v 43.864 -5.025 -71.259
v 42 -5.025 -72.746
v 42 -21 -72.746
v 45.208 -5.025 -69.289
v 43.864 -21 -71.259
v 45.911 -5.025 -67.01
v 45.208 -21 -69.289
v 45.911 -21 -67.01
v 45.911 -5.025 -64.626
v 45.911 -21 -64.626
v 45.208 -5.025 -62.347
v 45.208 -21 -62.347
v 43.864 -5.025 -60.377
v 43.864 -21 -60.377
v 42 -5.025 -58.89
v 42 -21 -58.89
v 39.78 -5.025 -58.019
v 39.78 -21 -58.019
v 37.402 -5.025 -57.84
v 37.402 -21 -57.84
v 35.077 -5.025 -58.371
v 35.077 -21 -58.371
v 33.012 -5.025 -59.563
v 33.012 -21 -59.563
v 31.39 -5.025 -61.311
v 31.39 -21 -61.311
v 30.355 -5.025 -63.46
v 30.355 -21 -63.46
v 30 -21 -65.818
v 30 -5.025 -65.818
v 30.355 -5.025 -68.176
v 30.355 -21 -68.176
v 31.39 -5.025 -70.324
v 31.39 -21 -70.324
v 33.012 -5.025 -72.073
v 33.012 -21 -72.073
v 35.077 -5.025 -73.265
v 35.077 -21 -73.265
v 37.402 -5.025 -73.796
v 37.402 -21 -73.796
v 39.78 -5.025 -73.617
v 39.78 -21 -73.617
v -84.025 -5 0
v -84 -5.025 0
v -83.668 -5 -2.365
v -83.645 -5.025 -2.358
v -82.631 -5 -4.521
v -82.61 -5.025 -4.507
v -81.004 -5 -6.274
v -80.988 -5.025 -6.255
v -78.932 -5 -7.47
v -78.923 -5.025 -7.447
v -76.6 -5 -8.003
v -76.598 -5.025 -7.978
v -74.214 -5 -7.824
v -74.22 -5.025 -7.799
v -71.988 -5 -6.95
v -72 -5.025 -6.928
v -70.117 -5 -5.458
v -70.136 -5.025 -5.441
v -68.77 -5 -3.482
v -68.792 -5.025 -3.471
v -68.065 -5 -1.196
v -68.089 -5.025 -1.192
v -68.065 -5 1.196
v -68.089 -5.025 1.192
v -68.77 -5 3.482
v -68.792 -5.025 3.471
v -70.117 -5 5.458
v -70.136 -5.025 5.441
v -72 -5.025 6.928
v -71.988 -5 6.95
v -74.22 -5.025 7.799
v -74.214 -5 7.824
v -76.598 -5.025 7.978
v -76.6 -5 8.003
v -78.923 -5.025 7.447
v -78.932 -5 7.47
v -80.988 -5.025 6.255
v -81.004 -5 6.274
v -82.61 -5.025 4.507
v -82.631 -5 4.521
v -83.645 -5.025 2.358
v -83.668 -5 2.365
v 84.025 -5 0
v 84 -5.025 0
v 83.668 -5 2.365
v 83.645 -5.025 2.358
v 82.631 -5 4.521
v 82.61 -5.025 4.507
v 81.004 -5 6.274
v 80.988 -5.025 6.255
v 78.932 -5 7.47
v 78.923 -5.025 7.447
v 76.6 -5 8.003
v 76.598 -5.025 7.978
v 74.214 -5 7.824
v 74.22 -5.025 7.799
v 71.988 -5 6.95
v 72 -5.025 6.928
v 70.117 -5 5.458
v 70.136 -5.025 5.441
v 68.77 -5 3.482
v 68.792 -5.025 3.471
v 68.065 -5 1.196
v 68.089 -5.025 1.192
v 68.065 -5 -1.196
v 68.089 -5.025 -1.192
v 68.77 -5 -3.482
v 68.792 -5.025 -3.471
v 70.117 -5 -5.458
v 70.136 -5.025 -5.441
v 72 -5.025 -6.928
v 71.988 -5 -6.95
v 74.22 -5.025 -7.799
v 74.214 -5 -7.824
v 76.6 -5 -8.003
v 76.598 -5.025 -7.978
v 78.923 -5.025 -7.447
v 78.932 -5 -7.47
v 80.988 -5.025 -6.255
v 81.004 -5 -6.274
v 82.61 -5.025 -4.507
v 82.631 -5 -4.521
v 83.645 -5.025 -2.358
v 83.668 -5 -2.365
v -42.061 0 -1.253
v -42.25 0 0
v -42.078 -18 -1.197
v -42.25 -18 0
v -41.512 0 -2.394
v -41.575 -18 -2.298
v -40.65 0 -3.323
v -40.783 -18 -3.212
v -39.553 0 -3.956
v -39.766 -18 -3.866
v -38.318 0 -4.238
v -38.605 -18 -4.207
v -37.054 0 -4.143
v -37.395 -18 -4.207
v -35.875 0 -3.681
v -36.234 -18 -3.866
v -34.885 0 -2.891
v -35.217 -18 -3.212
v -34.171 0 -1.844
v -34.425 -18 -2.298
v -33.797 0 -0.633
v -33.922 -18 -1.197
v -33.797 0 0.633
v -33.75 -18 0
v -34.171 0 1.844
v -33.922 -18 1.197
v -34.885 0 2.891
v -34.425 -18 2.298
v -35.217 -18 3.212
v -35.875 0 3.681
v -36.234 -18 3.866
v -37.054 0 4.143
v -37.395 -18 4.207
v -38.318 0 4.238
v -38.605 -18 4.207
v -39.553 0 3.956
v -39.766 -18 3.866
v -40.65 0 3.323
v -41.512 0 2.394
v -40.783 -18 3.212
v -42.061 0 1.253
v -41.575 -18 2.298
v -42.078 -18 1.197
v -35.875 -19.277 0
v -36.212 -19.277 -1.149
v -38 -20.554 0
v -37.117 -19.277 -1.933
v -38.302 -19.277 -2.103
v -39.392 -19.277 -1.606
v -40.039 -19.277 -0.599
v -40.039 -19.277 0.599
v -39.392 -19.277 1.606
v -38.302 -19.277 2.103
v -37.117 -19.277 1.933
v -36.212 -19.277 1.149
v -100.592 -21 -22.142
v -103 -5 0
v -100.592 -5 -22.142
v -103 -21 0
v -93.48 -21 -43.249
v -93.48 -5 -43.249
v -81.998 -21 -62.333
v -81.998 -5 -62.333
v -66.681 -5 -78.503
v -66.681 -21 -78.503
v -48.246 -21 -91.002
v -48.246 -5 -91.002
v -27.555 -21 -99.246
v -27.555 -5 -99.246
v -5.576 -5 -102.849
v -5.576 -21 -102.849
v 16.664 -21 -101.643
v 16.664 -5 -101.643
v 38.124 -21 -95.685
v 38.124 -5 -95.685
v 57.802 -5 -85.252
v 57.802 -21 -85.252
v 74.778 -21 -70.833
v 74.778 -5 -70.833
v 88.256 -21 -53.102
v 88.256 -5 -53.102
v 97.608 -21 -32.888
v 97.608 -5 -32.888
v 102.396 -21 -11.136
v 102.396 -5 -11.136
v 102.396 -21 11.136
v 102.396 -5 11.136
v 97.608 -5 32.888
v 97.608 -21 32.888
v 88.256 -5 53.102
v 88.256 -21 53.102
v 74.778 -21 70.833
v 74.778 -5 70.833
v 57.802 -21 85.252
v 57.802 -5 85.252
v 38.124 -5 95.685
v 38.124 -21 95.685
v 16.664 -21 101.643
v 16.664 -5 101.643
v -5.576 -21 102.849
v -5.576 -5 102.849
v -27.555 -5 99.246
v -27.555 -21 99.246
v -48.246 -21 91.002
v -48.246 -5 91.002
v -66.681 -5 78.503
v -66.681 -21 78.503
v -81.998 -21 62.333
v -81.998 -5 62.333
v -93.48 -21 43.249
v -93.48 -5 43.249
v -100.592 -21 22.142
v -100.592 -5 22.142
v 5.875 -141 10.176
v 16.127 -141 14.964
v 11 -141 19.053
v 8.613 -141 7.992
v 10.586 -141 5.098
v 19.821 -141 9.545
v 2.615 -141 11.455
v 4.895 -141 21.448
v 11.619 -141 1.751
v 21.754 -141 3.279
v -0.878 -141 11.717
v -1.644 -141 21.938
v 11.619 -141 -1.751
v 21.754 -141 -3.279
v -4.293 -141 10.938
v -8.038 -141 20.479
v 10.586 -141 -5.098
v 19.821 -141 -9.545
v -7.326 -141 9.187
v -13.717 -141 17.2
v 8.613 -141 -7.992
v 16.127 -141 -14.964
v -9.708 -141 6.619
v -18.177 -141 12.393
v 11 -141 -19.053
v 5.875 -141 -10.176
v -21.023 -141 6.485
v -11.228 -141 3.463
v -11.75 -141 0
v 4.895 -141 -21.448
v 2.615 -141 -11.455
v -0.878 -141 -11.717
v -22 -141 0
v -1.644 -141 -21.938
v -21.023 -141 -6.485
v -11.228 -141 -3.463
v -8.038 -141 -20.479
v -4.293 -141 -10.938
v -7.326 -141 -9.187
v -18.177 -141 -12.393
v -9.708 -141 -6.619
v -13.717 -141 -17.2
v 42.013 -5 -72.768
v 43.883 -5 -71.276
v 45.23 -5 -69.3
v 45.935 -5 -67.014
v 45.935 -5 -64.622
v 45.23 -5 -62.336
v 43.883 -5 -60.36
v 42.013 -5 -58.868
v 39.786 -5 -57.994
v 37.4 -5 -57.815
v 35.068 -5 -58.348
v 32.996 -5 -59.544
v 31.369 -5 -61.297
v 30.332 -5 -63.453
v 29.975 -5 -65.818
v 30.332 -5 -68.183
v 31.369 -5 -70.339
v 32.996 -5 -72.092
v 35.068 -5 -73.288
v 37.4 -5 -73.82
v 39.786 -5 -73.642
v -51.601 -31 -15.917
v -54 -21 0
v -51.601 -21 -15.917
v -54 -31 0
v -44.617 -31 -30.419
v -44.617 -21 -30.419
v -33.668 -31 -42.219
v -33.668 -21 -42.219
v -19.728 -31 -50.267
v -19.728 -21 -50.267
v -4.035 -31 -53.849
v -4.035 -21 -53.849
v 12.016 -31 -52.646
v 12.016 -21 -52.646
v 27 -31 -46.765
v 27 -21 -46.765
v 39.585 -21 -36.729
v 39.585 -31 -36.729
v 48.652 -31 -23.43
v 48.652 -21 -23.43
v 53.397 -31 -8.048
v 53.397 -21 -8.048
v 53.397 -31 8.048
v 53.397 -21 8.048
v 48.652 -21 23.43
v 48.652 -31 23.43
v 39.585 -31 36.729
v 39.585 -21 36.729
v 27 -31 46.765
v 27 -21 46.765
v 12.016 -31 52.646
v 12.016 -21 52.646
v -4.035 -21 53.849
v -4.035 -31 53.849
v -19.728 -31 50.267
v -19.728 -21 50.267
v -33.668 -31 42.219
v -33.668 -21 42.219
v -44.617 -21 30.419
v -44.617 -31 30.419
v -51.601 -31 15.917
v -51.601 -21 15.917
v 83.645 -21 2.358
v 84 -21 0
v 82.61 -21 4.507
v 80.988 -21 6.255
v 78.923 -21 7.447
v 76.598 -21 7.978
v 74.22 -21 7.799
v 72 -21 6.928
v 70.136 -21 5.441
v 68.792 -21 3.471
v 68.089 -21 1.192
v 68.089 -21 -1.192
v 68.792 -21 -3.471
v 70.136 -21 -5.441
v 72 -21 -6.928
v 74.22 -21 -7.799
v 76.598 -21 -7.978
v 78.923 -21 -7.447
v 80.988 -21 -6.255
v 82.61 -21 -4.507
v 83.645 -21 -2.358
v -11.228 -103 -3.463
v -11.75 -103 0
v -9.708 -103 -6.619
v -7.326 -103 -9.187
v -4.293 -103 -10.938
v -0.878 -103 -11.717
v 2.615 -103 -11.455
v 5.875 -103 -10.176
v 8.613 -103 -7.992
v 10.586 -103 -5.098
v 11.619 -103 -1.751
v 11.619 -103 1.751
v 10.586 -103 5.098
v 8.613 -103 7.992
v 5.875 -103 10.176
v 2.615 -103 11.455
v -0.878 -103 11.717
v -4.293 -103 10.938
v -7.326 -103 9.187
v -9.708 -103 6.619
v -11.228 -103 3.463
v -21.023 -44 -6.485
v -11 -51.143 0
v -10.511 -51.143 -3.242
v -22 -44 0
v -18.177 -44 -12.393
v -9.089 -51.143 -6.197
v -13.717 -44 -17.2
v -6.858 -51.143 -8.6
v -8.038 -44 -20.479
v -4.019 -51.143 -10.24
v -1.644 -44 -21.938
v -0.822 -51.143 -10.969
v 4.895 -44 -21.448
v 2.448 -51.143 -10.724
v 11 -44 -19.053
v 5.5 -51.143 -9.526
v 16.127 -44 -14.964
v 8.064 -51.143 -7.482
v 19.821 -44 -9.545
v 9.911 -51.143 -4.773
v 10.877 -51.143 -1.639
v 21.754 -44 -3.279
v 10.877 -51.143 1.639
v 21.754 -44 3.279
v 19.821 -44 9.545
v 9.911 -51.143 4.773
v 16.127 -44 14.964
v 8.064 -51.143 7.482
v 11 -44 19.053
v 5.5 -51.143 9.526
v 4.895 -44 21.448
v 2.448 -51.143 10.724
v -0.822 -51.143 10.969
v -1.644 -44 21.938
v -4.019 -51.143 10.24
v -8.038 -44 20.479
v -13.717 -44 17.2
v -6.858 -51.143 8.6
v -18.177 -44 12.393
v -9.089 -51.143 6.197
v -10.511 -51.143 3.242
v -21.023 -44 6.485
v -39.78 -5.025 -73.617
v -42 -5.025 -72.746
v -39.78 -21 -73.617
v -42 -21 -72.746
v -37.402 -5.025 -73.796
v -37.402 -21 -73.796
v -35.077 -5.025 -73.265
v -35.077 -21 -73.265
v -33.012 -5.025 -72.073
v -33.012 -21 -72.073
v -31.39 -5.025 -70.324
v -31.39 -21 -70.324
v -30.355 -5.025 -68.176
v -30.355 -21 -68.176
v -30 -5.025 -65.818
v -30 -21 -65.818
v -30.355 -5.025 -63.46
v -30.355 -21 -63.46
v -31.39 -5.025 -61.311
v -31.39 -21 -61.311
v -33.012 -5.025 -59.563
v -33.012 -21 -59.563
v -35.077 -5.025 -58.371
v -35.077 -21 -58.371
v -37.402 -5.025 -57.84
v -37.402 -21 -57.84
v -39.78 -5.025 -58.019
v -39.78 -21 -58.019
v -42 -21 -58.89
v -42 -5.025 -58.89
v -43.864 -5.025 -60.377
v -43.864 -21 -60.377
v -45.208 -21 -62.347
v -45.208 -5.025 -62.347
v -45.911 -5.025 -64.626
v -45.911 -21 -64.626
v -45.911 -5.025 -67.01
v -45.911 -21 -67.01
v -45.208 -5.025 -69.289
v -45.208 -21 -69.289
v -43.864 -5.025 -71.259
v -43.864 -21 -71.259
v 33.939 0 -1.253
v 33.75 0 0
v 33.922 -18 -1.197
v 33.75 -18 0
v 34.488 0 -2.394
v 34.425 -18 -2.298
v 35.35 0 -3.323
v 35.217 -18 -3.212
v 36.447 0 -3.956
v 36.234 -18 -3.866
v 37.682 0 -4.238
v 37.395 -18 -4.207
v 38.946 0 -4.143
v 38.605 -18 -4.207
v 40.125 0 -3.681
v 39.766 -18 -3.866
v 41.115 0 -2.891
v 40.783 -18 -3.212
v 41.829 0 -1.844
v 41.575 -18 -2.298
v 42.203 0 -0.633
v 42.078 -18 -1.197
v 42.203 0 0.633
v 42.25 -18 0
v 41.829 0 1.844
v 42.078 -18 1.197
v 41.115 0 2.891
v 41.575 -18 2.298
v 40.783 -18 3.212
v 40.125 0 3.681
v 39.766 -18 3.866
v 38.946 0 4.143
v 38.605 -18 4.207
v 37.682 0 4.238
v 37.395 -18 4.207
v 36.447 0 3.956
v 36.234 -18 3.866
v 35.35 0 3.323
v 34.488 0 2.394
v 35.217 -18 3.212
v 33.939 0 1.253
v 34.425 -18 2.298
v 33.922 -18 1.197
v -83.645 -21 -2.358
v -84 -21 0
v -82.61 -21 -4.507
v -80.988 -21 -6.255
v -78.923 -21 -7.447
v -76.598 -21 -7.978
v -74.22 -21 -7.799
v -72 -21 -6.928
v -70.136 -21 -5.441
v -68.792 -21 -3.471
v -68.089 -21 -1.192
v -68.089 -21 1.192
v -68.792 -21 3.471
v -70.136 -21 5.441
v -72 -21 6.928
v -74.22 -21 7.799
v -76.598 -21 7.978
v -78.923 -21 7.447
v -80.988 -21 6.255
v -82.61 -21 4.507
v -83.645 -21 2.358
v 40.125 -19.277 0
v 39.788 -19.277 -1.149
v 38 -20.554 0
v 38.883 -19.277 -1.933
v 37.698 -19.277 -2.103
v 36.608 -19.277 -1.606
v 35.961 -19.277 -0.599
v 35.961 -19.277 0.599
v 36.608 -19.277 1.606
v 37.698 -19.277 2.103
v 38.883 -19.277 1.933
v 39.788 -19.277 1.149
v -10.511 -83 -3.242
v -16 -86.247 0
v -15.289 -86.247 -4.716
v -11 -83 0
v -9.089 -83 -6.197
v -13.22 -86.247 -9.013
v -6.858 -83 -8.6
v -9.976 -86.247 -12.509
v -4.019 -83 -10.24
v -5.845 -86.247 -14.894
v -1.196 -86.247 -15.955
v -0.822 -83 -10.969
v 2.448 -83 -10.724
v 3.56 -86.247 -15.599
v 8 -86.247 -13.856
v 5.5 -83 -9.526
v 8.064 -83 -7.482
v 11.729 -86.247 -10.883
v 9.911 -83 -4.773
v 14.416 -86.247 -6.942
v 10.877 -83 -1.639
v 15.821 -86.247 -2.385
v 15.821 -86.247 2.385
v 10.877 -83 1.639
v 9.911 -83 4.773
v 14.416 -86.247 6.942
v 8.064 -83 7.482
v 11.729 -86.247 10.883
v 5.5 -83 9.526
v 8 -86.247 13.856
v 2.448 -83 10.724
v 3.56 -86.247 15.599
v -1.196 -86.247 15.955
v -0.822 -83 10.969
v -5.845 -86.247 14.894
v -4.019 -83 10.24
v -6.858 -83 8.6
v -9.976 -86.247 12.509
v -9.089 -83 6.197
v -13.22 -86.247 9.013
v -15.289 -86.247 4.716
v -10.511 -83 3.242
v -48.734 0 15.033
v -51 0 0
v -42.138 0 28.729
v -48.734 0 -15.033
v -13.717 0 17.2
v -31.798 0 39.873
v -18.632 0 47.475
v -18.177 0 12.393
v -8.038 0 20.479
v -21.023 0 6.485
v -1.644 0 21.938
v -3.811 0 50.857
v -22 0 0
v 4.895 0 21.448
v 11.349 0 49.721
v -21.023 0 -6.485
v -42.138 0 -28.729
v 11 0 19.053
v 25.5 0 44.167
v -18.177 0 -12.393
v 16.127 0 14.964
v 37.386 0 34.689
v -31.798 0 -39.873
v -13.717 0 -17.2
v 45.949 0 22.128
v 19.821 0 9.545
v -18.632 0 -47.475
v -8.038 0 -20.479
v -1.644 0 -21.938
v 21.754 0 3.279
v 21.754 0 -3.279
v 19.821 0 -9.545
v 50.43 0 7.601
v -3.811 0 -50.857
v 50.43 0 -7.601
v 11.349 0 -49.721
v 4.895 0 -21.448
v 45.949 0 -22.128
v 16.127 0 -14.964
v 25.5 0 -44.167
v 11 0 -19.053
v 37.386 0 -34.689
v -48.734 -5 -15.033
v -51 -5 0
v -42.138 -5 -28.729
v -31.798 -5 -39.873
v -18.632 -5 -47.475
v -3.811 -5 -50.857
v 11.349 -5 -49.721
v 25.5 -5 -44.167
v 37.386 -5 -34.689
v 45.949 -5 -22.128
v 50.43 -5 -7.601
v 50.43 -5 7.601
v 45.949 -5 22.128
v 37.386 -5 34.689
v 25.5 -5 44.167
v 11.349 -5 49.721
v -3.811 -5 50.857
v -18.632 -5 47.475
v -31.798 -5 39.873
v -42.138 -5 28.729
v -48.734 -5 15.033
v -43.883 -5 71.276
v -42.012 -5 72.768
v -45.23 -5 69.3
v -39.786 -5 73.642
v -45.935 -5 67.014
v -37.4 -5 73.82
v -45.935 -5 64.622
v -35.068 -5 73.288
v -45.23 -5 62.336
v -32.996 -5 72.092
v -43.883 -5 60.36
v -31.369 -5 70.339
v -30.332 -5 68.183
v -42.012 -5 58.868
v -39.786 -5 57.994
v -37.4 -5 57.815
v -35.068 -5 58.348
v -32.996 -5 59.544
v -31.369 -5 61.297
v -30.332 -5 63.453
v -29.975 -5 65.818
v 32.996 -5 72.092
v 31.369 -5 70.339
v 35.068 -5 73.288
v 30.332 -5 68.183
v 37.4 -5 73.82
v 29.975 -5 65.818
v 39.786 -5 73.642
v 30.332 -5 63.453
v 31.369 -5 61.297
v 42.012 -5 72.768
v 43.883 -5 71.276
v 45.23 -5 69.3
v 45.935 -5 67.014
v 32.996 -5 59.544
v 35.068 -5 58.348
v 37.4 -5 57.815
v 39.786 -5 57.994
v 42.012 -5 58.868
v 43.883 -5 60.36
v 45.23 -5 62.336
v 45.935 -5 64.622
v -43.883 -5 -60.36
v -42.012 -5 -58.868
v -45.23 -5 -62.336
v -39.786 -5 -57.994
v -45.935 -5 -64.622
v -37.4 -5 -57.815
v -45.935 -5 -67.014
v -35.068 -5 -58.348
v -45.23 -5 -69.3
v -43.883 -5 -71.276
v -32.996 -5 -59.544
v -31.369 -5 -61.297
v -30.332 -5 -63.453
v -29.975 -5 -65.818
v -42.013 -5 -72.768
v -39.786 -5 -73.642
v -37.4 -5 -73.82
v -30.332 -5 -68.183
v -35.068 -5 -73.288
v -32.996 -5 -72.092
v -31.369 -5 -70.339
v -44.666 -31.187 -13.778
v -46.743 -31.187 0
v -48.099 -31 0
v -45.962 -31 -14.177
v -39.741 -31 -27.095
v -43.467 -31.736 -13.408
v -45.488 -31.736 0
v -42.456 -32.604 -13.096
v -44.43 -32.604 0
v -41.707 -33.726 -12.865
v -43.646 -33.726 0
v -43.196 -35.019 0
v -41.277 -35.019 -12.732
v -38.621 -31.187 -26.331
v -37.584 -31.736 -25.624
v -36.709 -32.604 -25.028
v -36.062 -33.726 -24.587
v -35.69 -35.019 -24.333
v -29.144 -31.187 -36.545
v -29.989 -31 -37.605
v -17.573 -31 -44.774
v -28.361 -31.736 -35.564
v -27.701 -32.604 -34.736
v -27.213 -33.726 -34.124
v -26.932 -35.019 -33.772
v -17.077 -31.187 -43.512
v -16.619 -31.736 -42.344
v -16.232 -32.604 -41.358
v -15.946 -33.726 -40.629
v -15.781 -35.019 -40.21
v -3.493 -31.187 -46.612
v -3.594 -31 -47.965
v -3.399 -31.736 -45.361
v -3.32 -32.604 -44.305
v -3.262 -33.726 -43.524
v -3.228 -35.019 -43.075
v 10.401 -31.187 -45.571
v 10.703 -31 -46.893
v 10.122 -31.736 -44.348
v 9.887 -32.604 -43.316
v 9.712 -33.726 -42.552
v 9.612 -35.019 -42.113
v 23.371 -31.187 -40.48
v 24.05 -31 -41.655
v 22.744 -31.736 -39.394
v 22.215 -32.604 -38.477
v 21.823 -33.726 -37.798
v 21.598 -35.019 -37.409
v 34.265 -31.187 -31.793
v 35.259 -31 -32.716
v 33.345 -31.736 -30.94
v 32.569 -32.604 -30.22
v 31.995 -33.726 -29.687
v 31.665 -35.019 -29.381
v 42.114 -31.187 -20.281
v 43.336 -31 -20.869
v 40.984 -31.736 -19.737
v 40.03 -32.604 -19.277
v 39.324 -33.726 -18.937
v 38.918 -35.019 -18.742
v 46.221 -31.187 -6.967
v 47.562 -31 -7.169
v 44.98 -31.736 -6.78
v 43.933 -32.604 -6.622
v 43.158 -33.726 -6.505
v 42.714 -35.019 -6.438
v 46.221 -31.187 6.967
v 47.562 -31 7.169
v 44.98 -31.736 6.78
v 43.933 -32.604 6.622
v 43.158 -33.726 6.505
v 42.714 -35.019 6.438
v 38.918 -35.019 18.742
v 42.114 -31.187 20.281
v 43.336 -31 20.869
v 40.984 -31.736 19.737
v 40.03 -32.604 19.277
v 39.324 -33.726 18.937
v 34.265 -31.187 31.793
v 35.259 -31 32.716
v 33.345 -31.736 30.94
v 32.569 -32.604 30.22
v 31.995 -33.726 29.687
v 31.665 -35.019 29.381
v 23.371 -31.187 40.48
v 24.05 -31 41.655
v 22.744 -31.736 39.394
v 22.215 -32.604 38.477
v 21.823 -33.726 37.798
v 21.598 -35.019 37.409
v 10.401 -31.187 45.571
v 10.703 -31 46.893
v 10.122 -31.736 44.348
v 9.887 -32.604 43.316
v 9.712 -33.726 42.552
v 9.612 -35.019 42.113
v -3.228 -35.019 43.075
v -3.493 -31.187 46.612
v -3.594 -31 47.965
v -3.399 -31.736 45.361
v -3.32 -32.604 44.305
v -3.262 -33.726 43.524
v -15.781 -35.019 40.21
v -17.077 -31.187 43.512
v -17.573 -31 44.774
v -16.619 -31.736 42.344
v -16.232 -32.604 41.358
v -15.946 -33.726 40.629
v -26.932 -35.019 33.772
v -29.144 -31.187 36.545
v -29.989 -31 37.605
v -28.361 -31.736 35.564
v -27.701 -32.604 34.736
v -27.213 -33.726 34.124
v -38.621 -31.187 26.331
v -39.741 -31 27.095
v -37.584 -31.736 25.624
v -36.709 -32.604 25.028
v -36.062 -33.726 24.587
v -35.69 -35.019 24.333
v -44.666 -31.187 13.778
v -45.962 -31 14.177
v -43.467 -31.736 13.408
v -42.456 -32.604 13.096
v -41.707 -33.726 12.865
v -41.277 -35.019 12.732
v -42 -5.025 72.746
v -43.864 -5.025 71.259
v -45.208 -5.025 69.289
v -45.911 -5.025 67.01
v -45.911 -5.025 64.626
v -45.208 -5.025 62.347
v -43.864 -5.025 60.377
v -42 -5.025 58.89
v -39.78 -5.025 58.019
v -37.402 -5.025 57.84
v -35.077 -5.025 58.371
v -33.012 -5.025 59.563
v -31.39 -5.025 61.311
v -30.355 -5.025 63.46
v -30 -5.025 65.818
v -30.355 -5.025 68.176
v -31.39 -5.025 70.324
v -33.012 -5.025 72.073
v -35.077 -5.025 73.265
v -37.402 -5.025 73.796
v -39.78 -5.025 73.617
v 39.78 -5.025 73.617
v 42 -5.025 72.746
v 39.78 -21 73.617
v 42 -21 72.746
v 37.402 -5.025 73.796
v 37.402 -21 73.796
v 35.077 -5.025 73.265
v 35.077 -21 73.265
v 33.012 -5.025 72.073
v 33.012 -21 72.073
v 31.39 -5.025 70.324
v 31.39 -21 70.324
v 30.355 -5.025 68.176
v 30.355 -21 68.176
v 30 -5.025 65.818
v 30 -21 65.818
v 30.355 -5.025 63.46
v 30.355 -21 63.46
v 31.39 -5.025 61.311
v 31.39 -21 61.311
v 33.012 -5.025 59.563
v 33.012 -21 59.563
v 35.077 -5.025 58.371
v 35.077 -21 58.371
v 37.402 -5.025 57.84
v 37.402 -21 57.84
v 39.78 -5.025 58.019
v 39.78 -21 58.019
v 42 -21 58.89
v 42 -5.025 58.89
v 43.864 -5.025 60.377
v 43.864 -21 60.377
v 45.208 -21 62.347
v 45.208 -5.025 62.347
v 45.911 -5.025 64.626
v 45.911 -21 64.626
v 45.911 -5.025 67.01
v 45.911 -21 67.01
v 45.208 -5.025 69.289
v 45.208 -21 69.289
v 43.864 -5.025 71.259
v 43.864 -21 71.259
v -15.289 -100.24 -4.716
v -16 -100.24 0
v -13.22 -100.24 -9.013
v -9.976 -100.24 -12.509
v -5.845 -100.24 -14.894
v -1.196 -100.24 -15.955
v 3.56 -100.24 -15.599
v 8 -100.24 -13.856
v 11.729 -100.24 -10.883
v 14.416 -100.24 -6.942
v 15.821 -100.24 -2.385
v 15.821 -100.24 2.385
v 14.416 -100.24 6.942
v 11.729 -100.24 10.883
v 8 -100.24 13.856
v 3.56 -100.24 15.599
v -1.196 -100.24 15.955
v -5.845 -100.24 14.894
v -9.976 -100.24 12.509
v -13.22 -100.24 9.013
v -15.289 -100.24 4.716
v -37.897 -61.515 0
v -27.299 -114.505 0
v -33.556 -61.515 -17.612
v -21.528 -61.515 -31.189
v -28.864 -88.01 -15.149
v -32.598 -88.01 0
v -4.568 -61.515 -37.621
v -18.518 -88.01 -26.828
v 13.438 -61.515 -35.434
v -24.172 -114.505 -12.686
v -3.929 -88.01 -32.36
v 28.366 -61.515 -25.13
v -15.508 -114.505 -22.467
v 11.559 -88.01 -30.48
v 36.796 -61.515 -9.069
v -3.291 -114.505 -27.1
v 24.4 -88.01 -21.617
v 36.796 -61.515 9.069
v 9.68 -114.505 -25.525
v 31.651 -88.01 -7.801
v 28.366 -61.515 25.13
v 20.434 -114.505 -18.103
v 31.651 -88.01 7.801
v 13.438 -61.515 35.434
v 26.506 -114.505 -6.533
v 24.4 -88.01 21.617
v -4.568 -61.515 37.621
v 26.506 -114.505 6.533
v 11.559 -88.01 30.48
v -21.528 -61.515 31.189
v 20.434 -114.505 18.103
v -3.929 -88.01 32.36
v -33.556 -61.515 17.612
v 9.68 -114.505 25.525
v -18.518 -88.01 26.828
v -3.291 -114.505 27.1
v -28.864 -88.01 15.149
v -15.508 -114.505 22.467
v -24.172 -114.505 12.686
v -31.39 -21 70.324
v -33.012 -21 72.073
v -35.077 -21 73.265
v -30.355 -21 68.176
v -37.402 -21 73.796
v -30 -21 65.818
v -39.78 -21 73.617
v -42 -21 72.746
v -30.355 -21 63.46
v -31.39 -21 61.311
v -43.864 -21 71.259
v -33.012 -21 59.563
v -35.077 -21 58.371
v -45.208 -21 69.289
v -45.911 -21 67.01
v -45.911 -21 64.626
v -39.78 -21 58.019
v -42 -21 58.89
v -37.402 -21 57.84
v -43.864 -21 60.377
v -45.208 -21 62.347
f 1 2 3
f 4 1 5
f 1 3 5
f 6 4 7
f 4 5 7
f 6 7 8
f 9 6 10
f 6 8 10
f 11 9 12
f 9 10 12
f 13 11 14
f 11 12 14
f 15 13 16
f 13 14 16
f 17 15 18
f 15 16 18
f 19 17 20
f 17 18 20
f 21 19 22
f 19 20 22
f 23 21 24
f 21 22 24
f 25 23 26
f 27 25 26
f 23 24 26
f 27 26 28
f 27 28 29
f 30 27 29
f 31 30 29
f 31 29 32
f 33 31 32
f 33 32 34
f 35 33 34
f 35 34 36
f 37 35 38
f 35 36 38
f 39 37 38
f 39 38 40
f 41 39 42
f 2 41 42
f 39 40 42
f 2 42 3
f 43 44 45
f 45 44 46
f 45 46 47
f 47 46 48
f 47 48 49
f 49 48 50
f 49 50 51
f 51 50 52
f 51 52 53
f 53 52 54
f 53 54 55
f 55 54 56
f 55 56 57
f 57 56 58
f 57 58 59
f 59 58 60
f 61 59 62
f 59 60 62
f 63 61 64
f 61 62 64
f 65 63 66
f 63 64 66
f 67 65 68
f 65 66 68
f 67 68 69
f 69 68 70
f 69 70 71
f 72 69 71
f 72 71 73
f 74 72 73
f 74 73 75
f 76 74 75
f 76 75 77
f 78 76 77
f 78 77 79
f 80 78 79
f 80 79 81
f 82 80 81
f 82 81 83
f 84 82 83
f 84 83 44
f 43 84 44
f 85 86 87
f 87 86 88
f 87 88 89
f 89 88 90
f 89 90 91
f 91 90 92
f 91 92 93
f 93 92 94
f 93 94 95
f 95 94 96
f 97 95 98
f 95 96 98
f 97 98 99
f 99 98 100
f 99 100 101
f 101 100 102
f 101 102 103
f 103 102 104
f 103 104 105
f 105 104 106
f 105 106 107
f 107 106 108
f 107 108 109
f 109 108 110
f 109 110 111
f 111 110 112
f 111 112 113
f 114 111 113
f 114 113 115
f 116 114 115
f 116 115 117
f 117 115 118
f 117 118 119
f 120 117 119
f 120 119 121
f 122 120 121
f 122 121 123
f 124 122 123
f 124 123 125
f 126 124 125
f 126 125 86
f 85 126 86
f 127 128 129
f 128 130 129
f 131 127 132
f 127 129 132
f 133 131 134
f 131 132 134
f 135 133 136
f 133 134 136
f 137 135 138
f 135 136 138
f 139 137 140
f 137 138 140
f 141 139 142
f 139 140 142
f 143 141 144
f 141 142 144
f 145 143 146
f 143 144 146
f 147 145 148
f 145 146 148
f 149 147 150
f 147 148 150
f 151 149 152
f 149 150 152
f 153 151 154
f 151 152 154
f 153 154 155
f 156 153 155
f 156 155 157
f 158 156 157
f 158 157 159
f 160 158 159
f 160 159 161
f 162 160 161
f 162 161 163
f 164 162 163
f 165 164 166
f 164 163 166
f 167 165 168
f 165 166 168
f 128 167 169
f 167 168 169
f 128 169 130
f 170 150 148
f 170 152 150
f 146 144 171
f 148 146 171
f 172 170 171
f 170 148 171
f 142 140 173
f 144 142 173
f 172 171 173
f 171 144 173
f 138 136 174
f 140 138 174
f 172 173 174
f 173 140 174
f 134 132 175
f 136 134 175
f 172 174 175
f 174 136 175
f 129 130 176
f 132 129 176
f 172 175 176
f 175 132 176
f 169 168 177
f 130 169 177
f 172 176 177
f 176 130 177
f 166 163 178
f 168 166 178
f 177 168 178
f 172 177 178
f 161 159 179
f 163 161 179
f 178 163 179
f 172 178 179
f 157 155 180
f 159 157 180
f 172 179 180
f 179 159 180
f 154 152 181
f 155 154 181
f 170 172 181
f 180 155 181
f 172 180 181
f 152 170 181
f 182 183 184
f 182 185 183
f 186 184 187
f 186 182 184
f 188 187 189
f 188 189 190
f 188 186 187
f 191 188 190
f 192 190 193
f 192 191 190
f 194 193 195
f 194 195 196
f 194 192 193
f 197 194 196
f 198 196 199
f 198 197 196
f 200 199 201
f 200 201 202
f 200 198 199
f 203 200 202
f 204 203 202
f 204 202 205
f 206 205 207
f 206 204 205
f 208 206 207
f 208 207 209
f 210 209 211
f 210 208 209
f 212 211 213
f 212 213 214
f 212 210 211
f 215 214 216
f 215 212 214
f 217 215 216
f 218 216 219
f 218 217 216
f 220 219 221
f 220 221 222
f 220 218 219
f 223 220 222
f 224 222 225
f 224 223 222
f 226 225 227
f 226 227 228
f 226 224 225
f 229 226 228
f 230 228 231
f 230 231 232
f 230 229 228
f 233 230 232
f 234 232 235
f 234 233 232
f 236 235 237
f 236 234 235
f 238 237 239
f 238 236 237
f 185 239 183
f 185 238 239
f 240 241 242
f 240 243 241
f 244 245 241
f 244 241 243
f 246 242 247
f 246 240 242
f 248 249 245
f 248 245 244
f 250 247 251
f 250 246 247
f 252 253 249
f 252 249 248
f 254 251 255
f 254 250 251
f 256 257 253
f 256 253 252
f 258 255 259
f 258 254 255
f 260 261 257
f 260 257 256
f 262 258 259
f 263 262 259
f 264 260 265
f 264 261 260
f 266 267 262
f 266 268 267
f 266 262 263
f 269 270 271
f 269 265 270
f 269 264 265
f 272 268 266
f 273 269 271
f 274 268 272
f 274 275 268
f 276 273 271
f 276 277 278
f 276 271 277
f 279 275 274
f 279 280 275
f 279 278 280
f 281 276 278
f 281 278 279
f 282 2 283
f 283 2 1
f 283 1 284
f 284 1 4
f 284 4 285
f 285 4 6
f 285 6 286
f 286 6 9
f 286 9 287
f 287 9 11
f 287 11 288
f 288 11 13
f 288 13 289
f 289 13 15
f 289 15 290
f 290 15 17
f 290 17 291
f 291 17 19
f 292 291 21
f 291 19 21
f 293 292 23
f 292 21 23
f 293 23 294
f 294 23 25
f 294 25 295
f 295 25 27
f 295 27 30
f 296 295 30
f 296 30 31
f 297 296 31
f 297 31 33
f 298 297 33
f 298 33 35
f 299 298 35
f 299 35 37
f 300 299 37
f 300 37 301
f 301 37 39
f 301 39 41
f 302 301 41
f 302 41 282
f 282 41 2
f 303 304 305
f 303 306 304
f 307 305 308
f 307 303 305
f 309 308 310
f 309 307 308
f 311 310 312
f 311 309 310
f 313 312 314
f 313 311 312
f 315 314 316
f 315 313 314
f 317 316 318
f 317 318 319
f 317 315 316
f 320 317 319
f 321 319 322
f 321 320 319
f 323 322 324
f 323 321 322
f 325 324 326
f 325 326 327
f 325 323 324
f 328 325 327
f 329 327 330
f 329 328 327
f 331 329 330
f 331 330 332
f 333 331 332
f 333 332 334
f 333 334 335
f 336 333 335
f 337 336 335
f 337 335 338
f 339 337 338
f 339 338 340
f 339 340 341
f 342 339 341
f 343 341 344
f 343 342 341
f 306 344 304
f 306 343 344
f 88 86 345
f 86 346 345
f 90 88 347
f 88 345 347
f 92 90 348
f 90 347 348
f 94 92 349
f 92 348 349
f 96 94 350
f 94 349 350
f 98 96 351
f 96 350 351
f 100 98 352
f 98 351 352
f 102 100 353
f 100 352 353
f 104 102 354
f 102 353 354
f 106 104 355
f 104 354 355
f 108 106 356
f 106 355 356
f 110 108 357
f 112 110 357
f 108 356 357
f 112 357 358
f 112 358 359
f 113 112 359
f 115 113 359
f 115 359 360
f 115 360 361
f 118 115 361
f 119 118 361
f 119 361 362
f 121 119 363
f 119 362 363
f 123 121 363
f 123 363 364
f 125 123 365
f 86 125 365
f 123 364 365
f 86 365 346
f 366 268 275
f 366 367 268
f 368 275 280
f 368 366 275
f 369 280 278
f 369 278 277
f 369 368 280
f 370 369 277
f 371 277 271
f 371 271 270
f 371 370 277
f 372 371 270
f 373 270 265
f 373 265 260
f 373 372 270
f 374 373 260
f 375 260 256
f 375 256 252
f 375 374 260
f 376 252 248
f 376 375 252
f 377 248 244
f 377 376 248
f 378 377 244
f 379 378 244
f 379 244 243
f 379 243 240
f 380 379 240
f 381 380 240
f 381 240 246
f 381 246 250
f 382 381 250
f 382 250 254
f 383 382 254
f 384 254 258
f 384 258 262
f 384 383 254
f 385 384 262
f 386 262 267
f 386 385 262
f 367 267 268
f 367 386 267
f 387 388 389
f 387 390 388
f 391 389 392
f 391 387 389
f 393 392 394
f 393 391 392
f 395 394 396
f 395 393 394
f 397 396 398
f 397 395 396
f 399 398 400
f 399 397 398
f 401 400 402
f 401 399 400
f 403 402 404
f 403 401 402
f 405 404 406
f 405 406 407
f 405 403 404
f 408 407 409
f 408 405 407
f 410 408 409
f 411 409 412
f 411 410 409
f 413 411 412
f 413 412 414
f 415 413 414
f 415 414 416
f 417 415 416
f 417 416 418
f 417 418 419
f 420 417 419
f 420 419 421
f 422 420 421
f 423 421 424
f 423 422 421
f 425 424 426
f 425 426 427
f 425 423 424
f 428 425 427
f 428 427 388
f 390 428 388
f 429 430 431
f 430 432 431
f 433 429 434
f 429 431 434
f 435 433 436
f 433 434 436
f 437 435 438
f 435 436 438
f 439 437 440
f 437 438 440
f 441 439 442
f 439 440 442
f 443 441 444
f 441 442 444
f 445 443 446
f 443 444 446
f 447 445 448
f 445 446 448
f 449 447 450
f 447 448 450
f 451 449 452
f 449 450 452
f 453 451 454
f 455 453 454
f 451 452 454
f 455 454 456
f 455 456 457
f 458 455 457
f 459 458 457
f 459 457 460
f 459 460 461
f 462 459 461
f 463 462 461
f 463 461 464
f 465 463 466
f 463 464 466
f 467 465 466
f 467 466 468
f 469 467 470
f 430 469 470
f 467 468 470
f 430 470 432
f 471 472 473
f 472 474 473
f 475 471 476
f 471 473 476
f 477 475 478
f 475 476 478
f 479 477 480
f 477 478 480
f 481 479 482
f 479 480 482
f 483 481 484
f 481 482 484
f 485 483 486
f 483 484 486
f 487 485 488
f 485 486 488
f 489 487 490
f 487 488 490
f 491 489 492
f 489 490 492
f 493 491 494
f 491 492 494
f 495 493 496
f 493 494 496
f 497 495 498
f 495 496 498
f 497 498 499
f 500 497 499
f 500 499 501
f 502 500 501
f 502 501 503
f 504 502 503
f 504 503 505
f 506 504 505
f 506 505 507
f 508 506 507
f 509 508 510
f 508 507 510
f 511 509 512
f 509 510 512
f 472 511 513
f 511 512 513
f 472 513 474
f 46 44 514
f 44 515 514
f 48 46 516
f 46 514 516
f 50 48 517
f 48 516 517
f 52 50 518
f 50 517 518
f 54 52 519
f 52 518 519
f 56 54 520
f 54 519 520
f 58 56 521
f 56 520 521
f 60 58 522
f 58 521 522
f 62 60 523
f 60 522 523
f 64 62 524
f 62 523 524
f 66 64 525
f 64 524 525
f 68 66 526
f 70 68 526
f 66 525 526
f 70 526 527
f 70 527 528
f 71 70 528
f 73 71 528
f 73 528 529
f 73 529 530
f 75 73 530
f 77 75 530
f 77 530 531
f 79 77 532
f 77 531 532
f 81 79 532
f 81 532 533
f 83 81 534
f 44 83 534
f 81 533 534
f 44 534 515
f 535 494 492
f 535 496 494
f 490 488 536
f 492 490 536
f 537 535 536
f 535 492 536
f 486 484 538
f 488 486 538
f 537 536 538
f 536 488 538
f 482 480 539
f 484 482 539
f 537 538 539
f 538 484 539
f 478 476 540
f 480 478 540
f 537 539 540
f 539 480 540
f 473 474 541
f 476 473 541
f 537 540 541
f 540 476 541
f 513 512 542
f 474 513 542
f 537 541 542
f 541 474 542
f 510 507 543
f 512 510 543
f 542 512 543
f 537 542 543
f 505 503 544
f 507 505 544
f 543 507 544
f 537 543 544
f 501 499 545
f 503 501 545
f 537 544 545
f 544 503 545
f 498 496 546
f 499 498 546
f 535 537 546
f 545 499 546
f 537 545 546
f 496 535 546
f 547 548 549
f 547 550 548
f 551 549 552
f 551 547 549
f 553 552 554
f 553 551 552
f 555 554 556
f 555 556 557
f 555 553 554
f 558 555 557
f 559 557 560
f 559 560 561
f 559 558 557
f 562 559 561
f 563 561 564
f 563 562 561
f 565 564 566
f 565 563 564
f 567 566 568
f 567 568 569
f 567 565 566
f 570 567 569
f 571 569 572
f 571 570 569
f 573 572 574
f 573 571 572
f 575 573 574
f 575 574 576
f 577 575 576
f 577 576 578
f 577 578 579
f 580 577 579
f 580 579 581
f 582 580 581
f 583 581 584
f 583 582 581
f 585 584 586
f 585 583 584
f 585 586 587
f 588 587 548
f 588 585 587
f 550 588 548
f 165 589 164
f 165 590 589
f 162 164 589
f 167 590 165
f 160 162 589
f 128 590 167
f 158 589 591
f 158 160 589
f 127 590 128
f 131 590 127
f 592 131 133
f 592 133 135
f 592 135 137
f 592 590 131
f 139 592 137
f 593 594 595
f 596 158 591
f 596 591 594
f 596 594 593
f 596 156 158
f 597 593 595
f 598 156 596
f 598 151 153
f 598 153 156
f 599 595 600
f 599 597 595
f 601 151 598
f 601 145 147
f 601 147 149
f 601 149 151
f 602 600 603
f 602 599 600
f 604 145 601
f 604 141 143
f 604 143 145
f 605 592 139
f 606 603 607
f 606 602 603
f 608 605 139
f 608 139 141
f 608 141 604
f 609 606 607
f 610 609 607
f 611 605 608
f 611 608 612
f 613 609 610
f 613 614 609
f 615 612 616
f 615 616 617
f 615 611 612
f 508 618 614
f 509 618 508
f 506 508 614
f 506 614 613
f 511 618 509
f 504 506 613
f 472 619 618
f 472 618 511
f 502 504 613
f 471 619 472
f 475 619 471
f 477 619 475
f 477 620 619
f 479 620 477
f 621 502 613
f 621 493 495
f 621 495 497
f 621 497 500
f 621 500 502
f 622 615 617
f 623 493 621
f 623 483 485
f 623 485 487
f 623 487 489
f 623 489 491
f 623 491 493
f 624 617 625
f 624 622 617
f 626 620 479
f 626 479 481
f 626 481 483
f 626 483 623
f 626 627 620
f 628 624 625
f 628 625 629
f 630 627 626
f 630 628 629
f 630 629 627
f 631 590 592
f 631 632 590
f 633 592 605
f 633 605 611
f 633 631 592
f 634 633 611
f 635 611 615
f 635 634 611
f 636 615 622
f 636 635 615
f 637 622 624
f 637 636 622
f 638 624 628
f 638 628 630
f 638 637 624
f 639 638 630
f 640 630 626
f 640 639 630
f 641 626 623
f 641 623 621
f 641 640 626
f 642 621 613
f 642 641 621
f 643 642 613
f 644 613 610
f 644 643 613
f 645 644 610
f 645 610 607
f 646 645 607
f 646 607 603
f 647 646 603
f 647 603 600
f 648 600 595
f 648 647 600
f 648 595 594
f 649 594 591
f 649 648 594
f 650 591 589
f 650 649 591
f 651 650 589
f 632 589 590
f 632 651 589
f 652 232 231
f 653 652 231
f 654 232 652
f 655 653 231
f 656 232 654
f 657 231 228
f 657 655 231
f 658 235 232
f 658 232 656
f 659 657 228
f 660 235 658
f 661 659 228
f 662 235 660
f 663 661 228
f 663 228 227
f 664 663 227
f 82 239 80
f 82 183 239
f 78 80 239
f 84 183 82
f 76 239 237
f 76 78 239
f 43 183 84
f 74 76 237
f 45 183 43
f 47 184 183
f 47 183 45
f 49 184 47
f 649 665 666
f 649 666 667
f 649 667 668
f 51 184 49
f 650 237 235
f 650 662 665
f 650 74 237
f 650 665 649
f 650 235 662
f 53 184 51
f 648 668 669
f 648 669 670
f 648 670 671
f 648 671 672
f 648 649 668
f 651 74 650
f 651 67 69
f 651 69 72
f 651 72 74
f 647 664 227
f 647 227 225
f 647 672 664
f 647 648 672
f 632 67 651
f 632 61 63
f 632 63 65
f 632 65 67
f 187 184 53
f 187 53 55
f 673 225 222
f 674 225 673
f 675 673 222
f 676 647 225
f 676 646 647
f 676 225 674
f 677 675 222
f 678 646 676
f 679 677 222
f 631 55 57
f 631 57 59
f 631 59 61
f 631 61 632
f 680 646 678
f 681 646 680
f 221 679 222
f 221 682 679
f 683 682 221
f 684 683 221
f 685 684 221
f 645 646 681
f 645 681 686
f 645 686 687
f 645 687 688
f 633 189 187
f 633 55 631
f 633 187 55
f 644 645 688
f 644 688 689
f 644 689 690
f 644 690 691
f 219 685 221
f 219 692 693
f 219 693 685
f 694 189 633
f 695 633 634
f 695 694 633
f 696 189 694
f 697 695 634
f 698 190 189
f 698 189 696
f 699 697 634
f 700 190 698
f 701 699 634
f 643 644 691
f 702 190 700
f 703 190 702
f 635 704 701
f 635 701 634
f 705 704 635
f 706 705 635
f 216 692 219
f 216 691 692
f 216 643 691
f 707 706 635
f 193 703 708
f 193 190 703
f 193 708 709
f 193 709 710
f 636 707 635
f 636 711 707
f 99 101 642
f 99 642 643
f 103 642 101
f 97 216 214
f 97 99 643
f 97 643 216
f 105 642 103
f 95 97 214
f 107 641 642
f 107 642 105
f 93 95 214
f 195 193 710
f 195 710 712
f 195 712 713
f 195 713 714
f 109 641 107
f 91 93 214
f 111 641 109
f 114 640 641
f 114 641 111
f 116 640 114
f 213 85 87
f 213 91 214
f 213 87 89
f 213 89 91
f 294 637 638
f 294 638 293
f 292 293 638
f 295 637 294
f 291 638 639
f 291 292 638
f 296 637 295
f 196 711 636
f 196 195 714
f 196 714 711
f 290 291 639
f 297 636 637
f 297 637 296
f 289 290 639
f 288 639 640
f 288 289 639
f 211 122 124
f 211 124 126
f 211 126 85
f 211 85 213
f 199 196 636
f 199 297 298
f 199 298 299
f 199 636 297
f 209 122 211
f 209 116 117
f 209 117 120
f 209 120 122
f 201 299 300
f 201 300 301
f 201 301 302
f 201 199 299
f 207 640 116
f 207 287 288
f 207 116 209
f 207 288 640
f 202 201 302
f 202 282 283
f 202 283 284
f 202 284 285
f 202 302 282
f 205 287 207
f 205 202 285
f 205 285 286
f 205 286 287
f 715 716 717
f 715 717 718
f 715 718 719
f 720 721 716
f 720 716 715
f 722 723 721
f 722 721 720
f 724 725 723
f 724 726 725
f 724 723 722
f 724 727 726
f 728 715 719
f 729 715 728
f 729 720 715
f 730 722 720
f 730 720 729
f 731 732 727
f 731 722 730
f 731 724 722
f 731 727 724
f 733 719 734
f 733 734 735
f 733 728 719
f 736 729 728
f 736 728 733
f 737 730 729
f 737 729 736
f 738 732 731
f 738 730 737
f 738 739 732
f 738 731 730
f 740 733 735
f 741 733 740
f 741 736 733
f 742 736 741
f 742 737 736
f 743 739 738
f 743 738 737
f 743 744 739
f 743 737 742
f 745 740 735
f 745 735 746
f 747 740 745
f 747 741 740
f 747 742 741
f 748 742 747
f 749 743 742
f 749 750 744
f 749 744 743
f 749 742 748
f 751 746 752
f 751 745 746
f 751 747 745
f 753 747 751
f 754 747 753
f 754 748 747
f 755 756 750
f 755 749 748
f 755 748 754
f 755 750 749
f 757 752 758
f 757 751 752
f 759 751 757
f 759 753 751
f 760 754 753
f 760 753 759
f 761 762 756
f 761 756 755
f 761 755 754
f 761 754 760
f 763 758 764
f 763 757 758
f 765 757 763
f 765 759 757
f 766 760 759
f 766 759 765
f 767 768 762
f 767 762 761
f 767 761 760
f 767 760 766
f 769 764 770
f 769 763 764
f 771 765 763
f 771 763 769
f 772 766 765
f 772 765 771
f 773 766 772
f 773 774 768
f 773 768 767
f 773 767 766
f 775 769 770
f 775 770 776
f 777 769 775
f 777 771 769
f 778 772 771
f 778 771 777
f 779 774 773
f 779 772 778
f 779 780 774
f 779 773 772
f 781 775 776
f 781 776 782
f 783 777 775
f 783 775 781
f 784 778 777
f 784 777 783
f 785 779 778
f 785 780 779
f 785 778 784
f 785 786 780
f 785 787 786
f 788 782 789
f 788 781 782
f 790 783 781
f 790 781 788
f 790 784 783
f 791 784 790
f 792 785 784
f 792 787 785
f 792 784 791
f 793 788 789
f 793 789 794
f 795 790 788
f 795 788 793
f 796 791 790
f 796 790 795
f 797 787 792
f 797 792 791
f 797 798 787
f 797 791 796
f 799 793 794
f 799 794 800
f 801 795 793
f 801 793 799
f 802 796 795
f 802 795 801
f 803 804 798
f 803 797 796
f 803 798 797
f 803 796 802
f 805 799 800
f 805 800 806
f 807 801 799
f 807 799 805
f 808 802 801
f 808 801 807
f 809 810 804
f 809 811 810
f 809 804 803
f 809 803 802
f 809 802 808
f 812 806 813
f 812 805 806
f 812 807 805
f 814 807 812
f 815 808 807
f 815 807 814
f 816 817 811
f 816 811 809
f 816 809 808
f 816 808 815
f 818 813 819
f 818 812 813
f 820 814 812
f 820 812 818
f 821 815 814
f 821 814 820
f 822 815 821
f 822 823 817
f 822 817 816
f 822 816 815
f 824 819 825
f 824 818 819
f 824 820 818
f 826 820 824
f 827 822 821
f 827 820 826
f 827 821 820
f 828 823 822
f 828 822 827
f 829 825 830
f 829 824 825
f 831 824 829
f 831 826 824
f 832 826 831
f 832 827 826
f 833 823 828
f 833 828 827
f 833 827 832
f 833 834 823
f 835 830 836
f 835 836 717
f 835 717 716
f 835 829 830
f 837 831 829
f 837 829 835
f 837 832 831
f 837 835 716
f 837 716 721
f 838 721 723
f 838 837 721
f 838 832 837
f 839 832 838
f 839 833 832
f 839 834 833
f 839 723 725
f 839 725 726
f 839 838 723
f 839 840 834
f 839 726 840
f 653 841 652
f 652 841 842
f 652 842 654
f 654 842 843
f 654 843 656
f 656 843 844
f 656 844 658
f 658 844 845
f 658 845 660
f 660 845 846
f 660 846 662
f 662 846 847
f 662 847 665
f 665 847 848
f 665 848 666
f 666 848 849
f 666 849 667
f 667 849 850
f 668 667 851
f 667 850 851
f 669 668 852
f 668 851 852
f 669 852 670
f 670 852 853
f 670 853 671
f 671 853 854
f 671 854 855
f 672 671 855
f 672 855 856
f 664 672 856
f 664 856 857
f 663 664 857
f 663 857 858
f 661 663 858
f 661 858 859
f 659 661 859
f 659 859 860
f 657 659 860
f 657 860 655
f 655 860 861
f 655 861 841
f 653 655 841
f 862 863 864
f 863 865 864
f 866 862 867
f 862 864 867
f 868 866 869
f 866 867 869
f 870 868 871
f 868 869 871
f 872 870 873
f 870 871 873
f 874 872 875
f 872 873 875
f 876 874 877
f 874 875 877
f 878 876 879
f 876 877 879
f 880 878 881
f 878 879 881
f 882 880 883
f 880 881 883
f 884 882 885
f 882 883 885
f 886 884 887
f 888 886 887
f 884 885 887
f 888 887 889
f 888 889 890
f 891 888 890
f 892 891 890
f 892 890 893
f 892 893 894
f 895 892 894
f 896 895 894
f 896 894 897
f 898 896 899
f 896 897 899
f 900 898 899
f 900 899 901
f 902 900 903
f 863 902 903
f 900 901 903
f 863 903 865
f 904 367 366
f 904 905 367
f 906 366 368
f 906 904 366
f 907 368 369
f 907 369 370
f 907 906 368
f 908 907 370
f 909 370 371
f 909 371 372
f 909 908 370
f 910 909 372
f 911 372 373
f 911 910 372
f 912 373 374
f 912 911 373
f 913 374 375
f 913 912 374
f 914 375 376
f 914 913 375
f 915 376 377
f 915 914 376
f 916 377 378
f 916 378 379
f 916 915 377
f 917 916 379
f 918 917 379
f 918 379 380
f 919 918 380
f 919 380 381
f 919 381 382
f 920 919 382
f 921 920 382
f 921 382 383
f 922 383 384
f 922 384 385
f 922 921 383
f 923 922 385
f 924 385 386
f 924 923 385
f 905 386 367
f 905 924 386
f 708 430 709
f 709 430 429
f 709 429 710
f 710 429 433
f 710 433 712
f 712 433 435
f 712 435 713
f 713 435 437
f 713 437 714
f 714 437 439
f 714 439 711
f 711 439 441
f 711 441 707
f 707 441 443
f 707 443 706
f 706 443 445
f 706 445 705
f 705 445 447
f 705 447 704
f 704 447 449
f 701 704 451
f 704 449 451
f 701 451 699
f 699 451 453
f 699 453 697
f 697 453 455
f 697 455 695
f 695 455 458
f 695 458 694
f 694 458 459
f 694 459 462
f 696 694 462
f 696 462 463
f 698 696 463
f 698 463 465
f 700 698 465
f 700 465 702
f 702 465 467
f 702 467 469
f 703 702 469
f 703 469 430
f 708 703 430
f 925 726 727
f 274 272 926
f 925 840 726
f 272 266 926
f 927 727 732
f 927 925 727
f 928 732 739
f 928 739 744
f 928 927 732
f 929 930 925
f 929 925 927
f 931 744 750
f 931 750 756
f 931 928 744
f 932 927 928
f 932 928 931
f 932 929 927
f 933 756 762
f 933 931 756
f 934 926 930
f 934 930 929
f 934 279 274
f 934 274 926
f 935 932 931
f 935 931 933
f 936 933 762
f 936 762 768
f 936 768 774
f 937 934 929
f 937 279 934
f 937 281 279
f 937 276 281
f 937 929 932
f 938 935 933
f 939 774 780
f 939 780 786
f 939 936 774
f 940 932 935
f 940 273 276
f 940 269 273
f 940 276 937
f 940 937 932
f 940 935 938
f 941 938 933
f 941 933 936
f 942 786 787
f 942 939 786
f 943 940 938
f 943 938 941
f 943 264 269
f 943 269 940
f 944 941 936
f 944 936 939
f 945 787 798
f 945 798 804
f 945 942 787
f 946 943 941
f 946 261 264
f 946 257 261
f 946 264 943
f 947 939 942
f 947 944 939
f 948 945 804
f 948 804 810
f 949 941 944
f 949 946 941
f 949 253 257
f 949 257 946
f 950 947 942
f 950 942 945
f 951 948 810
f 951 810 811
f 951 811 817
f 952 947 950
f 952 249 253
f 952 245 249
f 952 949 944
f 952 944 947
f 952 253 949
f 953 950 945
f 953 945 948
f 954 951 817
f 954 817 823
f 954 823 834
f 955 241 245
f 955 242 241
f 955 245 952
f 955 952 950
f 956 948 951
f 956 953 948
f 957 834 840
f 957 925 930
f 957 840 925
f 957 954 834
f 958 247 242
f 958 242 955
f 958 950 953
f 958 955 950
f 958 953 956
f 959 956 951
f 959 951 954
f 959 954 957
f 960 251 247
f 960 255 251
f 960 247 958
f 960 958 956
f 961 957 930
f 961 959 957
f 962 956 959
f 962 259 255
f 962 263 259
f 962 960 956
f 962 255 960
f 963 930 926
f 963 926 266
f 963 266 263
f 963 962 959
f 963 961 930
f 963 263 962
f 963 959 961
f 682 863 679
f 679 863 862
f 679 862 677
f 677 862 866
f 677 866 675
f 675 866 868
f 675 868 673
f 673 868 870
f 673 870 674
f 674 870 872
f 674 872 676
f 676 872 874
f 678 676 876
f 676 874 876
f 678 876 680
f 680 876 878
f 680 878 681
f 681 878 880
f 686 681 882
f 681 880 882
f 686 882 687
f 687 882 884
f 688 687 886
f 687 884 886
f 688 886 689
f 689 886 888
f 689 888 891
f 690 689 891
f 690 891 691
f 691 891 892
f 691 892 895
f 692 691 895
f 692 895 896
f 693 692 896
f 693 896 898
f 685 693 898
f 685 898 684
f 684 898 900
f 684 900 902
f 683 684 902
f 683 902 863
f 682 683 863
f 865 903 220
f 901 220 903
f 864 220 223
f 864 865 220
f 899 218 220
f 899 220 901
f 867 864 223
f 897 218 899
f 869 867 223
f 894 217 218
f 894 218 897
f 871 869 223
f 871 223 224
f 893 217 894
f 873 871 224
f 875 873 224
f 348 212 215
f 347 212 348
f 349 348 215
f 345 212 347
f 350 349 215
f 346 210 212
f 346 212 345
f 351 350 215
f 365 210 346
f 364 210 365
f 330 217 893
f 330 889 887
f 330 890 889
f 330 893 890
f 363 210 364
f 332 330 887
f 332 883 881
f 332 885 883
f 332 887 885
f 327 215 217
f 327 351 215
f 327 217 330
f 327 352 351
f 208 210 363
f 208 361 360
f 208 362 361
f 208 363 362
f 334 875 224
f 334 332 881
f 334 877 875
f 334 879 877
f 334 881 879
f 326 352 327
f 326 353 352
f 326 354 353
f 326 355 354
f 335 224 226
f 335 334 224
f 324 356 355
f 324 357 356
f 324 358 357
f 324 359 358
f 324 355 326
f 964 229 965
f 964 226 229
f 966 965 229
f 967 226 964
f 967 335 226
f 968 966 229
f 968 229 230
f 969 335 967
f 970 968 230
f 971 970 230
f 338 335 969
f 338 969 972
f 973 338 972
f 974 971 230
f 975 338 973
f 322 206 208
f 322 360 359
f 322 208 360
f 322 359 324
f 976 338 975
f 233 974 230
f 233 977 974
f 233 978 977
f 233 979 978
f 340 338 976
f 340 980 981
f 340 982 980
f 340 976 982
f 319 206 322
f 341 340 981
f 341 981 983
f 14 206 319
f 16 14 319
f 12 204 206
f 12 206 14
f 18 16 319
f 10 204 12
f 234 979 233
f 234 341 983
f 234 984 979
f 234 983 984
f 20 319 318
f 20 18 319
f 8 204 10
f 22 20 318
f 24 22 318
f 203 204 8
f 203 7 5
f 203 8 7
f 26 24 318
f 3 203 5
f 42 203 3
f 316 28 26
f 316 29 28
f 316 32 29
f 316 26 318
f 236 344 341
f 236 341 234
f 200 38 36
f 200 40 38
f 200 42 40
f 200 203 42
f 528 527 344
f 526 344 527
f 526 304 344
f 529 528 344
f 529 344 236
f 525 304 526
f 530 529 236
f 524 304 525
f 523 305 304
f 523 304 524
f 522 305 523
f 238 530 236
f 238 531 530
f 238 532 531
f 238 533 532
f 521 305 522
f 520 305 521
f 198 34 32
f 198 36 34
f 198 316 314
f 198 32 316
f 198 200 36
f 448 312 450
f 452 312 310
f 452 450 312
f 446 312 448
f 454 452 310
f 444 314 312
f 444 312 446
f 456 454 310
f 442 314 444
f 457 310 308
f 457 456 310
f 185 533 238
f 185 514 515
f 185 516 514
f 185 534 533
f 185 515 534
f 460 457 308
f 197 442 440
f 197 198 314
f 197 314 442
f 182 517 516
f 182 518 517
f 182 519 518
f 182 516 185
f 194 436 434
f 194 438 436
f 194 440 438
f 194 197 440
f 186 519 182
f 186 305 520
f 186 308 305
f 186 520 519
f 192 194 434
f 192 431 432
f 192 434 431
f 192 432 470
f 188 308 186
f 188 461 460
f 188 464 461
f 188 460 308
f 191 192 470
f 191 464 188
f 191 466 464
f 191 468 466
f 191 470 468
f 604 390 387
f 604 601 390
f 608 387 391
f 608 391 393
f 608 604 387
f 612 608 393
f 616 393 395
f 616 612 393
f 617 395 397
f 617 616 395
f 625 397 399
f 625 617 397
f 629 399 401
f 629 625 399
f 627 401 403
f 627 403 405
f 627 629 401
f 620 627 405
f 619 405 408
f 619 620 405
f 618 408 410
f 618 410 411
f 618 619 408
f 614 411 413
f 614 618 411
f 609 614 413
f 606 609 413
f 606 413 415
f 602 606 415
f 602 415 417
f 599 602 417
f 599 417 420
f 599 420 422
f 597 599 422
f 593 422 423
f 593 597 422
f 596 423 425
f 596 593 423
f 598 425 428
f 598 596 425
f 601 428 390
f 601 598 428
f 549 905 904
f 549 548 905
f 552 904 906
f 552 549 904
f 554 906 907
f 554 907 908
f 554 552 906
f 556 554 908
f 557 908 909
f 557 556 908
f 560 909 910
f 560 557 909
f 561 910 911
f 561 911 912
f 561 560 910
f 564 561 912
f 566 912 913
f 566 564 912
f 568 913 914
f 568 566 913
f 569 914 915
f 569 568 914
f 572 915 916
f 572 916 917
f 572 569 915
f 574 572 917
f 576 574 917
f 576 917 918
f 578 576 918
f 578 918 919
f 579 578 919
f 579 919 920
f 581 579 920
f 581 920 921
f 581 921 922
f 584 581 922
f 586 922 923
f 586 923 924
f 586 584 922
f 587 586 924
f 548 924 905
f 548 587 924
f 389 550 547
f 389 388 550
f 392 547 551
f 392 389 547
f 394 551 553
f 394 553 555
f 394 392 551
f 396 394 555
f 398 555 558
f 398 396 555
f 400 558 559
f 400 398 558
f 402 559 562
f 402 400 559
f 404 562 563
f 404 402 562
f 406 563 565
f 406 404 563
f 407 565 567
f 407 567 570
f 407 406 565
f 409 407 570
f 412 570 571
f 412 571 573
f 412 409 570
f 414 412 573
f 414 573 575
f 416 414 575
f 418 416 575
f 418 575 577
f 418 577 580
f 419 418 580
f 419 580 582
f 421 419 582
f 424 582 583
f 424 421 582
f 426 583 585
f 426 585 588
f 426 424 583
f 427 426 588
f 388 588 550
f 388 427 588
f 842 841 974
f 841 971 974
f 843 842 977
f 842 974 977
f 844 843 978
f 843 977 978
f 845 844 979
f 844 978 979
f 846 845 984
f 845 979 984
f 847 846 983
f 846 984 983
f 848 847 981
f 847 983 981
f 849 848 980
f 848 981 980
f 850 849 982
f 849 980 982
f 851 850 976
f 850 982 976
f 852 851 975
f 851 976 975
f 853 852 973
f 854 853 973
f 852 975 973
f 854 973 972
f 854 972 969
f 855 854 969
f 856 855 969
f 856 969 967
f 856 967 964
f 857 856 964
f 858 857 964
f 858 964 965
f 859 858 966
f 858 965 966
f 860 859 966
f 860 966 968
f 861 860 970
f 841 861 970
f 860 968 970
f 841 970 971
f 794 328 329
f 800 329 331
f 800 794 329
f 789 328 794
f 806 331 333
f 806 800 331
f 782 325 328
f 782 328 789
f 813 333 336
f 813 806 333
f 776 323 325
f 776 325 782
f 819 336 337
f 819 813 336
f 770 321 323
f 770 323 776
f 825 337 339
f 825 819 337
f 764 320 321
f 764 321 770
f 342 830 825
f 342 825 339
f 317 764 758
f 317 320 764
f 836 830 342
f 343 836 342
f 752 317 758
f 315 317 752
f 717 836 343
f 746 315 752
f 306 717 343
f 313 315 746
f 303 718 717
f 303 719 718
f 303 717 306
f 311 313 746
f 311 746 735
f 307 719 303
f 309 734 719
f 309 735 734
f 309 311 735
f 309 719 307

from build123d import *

# Parameters (mm, degrees)
FILLET1_R                            = 5
F_16_0_16_DIAMETER_HOLE1_D           = 16
F_16_0_16_DIAMETER_HOLE1_CSINK_D     = 16.05
F_16_0_16_DIAMETER_HOLE1_CSINK_ANGLE = 90
CIRPATTERN1_COUNT                    = 6
M10X1_5_TAPPED_HOLE1_D               = 8.5
M10X1_5_TAPPED_HOLE1_DEPTH           = 18
M10X1_5_TAPPED_HOLE1_TIP             = 2.553657631


with BuildPart() as part:
    # Sketch1 → Revolve1 (revolve)
    with BuildSketch(Plane.XY, mode=Mode.PRIVATE) as revolve1_sk:
        Polygon((0, 0), (51, 0), (51, -5), (103, -5), (103, -21), (54, -21), (54, -31), (44, -31), (22, -141), (0, -141), align=None)
    revolve(revolve1_sk.sketch.rotate(Axis((0, 0, 0), (0, -1, 0)), 180), axis=Axis((0, 0, 0), (0, -1, 0)))

    # Sketch2 → Cut-Revolve1 (revolve, cut)
    with BuildSketch(Plane.XY):
        Polygon((-11.75, -141), (-11.75, -103), (-16, -100.240017729), (-16, -86.247037966), (-11, -83), (-11, -51.143483525), (-22, -44), (-22, 0), (0, 0), (0, -141), align=None)
    revolve(axis=Axis((0, 0, 0), (0, -1, 0)), mode=Mode.SUBTRACT)

    # Fillet1
    fillet1_edges = [part.edges().sort_by_distance(p)[0] for p in [
        (44, -31, 0),
    ]]
    fillet(fillet1_edges, radius=FILLET1_R)

    # Ø16.0 (16) Diameter Hole1 (through all)
    with Locations(Plane(origin=(0, -5, 0), x_dir=(1, 0, 0), z_dir=(0, 1, 0))):
        with Locations((-76, 0)):
            f_16_0_16_diameter_hole1 = CounterSinkHole(F_16_0_16_DIAMETER_HOLE1_D / 2, F_16_0_16_DIAMETER_HOLE1_CSINK_D / 2, counter_sink_angle=F_16_0_16_DIAMETER_HOLE1_CSINK_ANGLE)

    # CirPattern1: Ø16.0 (16) Diameter Hole1 ×6 about axis
    cirpattern1_axis = Axis((0, 0, 0), (0, 1, 0))
    for i in range(1, CIRPATTERN1_COUNT):
        add(f_16_0_16_diameter_hole1.rotate(cirpattern1_axis, i * 360 / CIRPATTERN1_COUNT), mode=Mode.SUBTRACT)

    # M10x1.5 Tapped Hole1
    with Locations(Plane(origin=(0, 0, 0), x_dir=(1, 0, 0), z_dir=(0, 1, 0))):
        with Locations((38, 0), (-38, 0)):
            Hole(M10X1_5_TAPPED_HOLE1_D / 2, depth=M10X1_5_TAPPED_HOLE1_DEPTH)
            with Locations((0, 0, -(M10X1_5_TAPPED_HOLE1_DEPTH + M10X1_5_TAPPED_HOLE1_TIP / 2))):  # 118° drill point
                Cone(0, M10X1_5_TAPPED_HOLE1_D / 2, M10X1_5_TAPPED_HOLE1_TIP, mode=Mode.SUBTRACT)


solid = part.part
